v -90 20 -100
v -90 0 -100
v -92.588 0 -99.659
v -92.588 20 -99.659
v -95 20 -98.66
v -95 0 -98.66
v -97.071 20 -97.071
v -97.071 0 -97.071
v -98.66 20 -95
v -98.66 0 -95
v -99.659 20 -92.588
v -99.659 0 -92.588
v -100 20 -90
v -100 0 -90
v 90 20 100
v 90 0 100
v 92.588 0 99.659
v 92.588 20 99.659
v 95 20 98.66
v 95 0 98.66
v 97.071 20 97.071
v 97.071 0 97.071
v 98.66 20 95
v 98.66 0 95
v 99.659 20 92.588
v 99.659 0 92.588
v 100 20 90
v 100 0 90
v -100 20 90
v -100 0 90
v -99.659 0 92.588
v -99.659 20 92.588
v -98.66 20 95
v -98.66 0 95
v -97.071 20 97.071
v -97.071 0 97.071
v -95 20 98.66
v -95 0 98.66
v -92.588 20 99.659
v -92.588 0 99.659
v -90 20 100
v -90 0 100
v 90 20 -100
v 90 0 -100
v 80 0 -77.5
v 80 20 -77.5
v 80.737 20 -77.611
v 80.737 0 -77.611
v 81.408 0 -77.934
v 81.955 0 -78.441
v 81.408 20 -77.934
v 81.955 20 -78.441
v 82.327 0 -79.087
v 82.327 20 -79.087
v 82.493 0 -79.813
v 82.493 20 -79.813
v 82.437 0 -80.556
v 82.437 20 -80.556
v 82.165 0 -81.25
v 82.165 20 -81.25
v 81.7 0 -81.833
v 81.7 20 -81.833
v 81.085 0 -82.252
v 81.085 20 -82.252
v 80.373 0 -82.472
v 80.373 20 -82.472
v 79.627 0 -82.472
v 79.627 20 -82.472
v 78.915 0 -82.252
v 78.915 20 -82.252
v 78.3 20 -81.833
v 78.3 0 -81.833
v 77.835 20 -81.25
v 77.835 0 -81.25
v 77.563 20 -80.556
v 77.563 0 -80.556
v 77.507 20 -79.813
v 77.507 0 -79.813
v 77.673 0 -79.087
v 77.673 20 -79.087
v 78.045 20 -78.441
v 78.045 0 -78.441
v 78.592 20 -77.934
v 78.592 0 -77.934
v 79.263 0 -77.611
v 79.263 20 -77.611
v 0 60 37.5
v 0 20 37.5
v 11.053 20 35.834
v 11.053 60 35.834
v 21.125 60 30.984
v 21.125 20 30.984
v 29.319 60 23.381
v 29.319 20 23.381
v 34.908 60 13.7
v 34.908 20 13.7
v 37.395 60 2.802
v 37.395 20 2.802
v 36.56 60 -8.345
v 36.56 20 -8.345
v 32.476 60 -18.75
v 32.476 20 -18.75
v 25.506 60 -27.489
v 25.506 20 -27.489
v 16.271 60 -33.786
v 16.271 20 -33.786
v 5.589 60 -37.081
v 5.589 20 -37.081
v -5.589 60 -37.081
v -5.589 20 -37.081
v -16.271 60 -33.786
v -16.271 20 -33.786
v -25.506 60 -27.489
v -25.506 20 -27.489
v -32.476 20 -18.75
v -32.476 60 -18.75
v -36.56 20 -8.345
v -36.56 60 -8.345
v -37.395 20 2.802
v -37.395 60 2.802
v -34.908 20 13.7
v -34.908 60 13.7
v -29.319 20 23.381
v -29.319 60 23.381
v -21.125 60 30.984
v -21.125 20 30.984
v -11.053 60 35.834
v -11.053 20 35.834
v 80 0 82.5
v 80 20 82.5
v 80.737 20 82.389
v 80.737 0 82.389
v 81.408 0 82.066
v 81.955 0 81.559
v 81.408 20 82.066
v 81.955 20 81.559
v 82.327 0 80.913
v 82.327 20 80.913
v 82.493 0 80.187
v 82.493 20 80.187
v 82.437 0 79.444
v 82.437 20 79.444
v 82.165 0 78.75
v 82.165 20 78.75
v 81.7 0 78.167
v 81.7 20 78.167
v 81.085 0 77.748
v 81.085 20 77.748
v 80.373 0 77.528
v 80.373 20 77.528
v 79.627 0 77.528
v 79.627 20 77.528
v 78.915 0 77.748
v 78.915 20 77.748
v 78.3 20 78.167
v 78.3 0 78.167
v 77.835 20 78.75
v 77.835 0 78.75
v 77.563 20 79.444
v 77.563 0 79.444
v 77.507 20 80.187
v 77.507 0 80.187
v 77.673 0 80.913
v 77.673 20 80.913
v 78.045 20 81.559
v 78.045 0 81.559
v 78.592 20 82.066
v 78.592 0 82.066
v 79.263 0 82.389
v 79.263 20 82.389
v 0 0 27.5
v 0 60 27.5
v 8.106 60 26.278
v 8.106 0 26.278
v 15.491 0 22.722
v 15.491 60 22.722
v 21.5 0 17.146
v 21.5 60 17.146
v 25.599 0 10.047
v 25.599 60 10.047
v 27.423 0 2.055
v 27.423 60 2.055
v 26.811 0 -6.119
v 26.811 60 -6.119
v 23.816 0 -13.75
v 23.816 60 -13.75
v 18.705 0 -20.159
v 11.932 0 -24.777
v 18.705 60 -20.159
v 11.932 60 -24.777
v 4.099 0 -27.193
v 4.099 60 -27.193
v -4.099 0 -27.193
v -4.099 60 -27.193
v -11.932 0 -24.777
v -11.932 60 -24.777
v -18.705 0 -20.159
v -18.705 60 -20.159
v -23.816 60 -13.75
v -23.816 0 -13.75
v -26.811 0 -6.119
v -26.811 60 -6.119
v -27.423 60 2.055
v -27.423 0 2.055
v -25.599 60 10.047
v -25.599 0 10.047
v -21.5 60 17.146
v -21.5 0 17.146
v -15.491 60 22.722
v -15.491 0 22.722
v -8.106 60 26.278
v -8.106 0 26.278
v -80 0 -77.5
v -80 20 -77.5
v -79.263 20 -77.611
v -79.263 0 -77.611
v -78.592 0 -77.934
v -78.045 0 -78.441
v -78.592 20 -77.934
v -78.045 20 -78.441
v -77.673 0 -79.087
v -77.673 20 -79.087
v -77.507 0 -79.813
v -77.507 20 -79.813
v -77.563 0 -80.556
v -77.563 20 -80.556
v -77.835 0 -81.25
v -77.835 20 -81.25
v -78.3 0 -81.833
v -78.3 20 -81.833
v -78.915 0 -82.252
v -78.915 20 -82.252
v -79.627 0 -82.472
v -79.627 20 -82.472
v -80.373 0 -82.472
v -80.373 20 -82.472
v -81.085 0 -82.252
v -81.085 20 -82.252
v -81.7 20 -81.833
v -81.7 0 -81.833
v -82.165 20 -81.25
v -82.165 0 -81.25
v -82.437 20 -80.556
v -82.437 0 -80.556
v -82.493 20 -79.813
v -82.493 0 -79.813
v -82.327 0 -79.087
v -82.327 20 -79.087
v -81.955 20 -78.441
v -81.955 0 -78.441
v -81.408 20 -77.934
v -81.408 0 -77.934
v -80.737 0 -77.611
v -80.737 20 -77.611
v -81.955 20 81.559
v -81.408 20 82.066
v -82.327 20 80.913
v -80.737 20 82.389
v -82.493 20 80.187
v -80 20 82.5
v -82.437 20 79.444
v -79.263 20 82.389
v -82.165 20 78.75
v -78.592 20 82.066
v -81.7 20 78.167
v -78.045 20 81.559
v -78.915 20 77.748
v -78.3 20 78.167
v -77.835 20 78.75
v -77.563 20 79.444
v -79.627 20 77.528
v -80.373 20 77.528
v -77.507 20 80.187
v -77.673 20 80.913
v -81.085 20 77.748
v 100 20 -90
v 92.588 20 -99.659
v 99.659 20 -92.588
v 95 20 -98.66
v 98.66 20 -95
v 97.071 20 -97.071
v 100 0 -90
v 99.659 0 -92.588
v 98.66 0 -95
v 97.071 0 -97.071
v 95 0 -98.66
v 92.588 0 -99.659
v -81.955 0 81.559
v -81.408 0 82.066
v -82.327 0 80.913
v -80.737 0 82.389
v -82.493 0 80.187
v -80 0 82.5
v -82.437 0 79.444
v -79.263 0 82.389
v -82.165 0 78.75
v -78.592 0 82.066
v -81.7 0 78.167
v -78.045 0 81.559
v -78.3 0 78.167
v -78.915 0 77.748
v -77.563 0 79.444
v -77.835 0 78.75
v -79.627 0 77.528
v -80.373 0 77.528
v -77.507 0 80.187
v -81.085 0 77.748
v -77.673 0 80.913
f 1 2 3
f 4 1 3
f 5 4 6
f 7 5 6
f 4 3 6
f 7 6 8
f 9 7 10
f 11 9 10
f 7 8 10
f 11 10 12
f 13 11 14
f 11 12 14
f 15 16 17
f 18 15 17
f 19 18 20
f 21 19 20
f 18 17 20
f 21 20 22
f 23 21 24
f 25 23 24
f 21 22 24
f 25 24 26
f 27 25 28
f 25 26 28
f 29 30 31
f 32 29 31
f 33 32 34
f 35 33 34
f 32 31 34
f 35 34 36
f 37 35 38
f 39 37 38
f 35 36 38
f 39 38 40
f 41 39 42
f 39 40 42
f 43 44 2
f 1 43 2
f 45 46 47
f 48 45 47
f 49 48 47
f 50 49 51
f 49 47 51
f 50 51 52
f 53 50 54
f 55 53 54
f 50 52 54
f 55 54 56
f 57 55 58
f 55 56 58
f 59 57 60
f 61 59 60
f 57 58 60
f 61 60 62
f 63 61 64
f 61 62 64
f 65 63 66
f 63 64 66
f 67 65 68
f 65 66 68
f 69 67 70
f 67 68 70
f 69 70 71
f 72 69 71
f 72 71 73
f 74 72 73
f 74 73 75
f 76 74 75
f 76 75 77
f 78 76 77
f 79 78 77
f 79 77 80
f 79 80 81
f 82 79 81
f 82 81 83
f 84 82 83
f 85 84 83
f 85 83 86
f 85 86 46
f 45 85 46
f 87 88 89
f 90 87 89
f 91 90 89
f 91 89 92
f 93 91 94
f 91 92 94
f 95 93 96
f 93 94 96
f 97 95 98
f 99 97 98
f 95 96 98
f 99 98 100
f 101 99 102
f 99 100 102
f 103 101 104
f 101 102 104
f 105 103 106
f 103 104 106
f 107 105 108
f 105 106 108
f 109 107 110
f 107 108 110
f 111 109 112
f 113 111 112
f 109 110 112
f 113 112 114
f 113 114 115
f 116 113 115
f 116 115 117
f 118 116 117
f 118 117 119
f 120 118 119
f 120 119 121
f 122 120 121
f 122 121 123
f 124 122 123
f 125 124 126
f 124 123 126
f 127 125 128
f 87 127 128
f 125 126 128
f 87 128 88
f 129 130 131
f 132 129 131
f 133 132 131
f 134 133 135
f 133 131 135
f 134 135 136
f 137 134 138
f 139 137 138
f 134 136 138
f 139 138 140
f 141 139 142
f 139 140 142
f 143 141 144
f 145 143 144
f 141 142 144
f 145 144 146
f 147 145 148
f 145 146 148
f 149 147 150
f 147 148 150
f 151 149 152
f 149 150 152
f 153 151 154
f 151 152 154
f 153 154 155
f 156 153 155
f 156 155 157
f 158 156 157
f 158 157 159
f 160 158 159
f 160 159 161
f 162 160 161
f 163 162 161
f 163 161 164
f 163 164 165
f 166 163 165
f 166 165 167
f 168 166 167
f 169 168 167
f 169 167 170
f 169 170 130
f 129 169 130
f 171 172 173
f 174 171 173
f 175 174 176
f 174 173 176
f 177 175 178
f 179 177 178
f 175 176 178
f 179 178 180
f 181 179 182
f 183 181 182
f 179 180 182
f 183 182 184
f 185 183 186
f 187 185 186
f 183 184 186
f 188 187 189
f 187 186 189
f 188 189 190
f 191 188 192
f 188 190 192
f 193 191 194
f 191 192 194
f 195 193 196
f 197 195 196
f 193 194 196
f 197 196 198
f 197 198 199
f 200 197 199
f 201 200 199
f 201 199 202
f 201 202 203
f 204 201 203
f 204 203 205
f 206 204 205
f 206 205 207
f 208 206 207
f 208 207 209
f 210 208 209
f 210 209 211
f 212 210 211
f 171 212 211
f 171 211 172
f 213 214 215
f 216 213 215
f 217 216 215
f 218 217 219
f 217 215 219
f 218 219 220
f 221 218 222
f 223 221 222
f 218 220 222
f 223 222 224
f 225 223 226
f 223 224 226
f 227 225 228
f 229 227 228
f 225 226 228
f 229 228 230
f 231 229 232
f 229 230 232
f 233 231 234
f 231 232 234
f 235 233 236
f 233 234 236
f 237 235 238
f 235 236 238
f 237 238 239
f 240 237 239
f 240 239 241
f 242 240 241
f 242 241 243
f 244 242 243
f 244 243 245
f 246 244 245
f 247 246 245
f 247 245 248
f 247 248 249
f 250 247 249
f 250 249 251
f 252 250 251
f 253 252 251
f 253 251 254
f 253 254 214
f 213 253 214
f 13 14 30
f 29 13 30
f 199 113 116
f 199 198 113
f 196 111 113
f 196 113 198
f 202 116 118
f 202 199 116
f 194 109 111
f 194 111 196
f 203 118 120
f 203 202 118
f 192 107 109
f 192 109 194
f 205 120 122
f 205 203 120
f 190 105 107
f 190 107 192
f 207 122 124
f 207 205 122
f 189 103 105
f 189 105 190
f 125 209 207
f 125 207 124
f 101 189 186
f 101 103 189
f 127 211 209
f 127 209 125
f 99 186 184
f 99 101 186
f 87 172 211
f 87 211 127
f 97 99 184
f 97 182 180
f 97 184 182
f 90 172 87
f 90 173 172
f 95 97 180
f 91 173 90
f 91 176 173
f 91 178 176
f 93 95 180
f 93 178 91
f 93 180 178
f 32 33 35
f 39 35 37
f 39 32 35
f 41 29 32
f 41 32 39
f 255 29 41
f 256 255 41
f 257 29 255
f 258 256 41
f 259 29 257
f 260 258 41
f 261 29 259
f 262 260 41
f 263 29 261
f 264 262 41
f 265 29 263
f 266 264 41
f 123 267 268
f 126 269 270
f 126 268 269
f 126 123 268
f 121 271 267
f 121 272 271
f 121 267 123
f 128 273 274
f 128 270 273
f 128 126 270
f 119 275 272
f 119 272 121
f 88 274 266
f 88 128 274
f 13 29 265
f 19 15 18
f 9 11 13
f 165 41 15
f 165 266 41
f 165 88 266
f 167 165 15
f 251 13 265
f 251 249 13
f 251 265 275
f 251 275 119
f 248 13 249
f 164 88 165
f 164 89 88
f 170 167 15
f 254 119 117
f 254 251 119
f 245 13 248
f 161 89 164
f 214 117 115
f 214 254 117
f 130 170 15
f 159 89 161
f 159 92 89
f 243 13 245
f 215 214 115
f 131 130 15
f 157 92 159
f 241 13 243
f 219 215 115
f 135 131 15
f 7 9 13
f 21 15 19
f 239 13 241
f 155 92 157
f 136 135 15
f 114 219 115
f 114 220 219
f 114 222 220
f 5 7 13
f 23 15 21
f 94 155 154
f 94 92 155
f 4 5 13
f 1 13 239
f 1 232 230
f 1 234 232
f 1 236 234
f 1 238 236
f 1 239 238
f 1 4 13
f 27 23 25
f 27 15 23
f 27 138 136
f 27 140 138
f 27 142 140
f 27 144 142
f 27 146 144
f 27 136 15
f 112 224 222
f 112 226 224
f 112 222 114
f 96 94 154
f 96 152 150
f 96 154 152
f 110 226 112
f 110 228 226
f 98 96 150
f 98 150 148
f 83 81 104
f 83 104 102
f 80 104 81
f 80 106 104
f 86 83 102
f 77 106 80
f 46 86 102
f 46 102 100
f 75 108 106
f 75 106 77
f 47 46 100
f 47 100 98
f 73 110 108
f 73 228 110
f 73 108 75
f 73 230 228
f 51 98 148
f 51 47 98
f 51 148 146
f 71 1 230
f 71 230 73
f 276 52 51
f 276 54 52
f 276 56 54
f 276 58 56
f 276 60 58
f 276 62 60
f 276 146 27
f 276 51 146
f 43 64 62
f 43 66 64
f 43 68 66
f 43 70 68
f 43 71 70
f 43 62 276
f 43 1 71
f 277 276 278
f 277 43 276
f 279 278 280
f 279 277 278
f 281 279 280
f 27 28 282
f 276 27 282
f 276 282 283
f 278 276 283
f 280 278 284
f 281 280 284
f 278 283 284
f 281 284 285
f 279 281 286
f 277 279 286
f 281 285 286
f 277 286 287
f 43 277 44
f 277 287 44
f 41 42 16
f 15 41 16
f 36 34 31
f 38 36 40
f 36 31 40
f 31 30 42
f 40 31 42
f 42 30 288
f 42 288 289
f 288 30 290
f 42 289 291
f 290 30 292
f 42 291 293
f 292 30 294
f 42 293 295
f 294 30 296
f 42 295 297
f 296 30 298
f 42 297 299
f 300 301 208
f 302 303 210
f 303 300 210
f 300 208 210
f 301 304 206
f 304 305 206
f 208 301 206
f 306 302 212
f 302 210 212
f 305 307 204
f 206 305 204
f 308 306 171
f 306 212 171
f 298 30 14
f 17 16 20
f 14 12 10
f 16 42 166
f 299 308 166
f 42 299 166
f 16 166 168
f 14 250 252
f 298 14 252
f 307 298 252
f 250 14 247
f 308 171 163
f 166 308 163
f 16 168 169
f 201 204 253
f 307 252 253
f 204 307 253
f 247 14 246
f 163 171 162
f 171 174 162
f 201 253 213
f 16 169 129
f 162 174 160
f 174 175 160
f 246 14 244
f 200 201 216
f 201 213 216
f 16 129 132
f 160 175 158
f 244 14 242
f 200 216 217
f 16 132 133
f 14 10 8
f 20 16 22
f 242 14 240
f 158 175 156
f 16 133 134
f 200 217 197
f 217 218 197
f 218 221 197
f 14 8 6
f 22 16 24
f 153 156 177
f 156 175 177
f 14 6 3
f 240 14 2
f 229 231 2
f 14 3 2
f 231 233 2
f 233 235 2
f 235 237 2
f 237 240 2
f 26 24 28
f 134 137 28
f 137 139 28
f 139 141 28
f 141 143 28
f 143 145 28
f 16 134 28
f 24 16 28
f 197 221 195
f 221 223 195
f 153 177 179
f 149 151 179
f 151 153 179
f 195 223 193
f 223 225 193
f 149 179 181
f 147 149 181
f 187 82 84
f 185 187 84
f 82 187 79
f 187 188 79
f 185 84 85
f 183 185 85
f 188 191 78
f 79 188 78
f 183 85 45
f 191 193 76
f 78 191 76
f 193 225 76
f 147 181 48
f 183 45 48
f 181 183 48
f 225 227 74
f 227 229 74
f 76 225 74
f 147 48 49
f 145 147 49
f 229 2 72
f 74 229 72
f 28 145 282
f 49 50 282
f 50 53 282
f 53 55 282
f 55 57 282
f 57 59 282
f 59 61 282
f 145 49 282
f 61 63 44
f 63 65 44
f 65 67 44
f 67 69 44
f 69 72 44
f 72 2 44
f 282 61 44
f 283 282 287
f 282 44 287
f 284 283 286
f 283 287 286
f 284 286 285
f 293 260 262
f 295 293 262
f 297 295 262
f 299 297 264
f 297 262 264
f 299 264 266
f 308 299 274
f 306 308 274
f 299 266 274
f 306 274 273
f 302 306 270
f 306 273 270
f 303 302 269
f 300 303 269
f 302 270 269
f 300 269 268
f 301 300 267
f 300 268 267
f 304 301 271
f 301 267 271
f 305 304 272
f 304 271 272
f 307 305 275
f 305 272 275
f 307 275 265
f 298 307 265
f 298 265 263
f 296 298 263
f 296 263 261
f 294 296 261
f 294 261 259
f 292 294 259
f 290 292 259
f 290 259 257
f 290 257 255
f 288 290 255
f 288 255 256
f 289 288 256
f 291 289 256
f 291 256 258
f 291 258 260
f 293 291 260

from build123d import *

# Parameters (mm, degrees)
BOSS_EXTRUDE1_DEPTH = 20
SKETCH2_R           = 37.5
BOSS_EXTRUDE2_DEPTH = 40
CUT_EXTRUDE1_REACH  = 148.969
SKETCH3_R           = 2.5
SKETCH4_R           = 27.5
CUT_EXTRUDE2_DEPTH  = 154.622914957


with BuildPart() as part:
    # Sketch1 → Boss-Extrude1 (new body)
    with BuildSketch(Plane(origin=(0, 0, 0), x_dir=(1, 0, 0), z_dir=(0, 1, 0))):
        with BuildLine():
            Line((-90, -100), (90, -100))
            ThreePointArc((90, -100), (97.071067812, -97.071067812), (100, -90))
            Line((100, -90), (100, 90))
            ThreePointArc((100, 90), (97.071067812, 97.071067812), (90, 100))
            Line((90, 100), (-90, 100))
            ThreePointArc((-90, 100), (-97.071067812, 97.071067812), (-100, 90))
            Line((-100, 90), (-100, -90))
            ThreePointArc((-100, -90), (-97.071067812, -97.071067812), (-90, -100))
        make_face()
    extrude(amount=BOSS_EXTRUDE1_DEPTH)

    # Sketch2 → Boss-Extrude2 (add)
    with BuildSketch(Plane(origin=(0, 20, 0), x_dir=(1, 0, 0), z_dir=(0, 1, 0))):
        with Locations(Location((0, 0, 0), (0, 0, 270))):
            Circle(SKETCH2_R)
    extrude(amount=BOSS_EXTRUDE2_DEPTH)

    # Sketch3 → Cut-Extrude1 (cut, up to next)
    with BuildSketch(Plane(origin=(0, 20, 0), x_dir=(1, 0, 0), z_dir=(0, 1, 0)), mode=Mode.PRIVATE) as cut_extrude1_sk1:
        with Locations(Location((-80, 80, 0), (0, 0, 270))):
            Circle(SKETCH3_R)
    cut_extrude1_tool1 = extrude(cut_extrude1_sk1.sketch, amount=-CUT_EXTRUDE1_REACH, mode=Mode.PRIVATE) & part.part
    # Sketch3 → Cut-Extrude1 (cut, up to next)
    with BuildSketch(Plane(origin=(0, 20, 0), x_dir=(1, 0, 0), z_dir=(0, 1, 0)), mode=Mode.PRIVATE) as cut_extrude1_sk2:
        with Locations(Location((80, 80, 0), (0, 0, 270))):
            Circle(SKETCH3_R)
    cut_extrude1_tool2 = extrude(cut_extrude1_sk2.sketch, amount=-CUT_EXTRUDE1_REACH, mode=Mode.PRIVATE) & part.part
    # Sketch3 → Cut-Extrude1 (cut, up to next)
    with BuildSketch(Plane(origin=(0, 20, 0), x_dir=(1, 0, 0), z_dir=(0, 1, 0)), mode=Mode.PRIVATE) as cut_extrude1_sk3:
        with Locations(Location((80, -80, 0), (0, 0, 270))):
            Circle(SKETCH3_R)
    cut_extrude1_tool3 = extrude(cut_extrude1_sk3.sketch, amount=-CUT_EXTRUDE1_REACH, mode=Mode.PRIVATE) & part.part
    # Sketch3 → Cut-Extrude1 (cut, up to next)
    with BuildSketch(Plane(origin=(0, 20, 0), x_dir=(1, 0, 0), z_dir=(0, 1, 0)), mode=Mode.PRIVATE) as cut_extrude1_sk4:
        with Locations(Location((-80, -80, 0), (0, 0, 270))):
            Circle(SKETCH3_R)
    cut_extrude1_tool4 = extrude(cut_extrude1_sk4.sketch, amount=-CUT_EXTRUDE1_REACH, mode=Mode.PRIVATE) & part.part
    add(cut_extrude1_tool1.solids().sort_by_distance((-80, 20, -80))[0], mode=Mode.SUBTRACT)
    add(cut_extrude1_tool2.solids().sort_by_distance((80, 20, -80))[0], mode=Mode.SUBTRACT)
    add(cut_extrude1_tool3.solids().sort_by_distance((80, 20, 80))[0], mode=Mode.SUBTRACT)
    add(cut_extrude1_tool4.solids().sort_by_distance((-80, 20, 80))[0], mode=Mode.SUBTRACT)

    # Sketch4 → Cut-Extrude2 (cut, through all)
    with BuildSketch(Plane(origin=(0, 60, 0), x_dir=(1, 0, 0), z_dir=(0, 1, 0))):
        with Locations(Location((0, 0, 0), (0, 0, 270))):
            Circle(SKETCH4_R)
    extrude(amount=-CUT_EXTRUDE2_DEPTH, mode=Mode.SUBTRACT)


solid = part.part
